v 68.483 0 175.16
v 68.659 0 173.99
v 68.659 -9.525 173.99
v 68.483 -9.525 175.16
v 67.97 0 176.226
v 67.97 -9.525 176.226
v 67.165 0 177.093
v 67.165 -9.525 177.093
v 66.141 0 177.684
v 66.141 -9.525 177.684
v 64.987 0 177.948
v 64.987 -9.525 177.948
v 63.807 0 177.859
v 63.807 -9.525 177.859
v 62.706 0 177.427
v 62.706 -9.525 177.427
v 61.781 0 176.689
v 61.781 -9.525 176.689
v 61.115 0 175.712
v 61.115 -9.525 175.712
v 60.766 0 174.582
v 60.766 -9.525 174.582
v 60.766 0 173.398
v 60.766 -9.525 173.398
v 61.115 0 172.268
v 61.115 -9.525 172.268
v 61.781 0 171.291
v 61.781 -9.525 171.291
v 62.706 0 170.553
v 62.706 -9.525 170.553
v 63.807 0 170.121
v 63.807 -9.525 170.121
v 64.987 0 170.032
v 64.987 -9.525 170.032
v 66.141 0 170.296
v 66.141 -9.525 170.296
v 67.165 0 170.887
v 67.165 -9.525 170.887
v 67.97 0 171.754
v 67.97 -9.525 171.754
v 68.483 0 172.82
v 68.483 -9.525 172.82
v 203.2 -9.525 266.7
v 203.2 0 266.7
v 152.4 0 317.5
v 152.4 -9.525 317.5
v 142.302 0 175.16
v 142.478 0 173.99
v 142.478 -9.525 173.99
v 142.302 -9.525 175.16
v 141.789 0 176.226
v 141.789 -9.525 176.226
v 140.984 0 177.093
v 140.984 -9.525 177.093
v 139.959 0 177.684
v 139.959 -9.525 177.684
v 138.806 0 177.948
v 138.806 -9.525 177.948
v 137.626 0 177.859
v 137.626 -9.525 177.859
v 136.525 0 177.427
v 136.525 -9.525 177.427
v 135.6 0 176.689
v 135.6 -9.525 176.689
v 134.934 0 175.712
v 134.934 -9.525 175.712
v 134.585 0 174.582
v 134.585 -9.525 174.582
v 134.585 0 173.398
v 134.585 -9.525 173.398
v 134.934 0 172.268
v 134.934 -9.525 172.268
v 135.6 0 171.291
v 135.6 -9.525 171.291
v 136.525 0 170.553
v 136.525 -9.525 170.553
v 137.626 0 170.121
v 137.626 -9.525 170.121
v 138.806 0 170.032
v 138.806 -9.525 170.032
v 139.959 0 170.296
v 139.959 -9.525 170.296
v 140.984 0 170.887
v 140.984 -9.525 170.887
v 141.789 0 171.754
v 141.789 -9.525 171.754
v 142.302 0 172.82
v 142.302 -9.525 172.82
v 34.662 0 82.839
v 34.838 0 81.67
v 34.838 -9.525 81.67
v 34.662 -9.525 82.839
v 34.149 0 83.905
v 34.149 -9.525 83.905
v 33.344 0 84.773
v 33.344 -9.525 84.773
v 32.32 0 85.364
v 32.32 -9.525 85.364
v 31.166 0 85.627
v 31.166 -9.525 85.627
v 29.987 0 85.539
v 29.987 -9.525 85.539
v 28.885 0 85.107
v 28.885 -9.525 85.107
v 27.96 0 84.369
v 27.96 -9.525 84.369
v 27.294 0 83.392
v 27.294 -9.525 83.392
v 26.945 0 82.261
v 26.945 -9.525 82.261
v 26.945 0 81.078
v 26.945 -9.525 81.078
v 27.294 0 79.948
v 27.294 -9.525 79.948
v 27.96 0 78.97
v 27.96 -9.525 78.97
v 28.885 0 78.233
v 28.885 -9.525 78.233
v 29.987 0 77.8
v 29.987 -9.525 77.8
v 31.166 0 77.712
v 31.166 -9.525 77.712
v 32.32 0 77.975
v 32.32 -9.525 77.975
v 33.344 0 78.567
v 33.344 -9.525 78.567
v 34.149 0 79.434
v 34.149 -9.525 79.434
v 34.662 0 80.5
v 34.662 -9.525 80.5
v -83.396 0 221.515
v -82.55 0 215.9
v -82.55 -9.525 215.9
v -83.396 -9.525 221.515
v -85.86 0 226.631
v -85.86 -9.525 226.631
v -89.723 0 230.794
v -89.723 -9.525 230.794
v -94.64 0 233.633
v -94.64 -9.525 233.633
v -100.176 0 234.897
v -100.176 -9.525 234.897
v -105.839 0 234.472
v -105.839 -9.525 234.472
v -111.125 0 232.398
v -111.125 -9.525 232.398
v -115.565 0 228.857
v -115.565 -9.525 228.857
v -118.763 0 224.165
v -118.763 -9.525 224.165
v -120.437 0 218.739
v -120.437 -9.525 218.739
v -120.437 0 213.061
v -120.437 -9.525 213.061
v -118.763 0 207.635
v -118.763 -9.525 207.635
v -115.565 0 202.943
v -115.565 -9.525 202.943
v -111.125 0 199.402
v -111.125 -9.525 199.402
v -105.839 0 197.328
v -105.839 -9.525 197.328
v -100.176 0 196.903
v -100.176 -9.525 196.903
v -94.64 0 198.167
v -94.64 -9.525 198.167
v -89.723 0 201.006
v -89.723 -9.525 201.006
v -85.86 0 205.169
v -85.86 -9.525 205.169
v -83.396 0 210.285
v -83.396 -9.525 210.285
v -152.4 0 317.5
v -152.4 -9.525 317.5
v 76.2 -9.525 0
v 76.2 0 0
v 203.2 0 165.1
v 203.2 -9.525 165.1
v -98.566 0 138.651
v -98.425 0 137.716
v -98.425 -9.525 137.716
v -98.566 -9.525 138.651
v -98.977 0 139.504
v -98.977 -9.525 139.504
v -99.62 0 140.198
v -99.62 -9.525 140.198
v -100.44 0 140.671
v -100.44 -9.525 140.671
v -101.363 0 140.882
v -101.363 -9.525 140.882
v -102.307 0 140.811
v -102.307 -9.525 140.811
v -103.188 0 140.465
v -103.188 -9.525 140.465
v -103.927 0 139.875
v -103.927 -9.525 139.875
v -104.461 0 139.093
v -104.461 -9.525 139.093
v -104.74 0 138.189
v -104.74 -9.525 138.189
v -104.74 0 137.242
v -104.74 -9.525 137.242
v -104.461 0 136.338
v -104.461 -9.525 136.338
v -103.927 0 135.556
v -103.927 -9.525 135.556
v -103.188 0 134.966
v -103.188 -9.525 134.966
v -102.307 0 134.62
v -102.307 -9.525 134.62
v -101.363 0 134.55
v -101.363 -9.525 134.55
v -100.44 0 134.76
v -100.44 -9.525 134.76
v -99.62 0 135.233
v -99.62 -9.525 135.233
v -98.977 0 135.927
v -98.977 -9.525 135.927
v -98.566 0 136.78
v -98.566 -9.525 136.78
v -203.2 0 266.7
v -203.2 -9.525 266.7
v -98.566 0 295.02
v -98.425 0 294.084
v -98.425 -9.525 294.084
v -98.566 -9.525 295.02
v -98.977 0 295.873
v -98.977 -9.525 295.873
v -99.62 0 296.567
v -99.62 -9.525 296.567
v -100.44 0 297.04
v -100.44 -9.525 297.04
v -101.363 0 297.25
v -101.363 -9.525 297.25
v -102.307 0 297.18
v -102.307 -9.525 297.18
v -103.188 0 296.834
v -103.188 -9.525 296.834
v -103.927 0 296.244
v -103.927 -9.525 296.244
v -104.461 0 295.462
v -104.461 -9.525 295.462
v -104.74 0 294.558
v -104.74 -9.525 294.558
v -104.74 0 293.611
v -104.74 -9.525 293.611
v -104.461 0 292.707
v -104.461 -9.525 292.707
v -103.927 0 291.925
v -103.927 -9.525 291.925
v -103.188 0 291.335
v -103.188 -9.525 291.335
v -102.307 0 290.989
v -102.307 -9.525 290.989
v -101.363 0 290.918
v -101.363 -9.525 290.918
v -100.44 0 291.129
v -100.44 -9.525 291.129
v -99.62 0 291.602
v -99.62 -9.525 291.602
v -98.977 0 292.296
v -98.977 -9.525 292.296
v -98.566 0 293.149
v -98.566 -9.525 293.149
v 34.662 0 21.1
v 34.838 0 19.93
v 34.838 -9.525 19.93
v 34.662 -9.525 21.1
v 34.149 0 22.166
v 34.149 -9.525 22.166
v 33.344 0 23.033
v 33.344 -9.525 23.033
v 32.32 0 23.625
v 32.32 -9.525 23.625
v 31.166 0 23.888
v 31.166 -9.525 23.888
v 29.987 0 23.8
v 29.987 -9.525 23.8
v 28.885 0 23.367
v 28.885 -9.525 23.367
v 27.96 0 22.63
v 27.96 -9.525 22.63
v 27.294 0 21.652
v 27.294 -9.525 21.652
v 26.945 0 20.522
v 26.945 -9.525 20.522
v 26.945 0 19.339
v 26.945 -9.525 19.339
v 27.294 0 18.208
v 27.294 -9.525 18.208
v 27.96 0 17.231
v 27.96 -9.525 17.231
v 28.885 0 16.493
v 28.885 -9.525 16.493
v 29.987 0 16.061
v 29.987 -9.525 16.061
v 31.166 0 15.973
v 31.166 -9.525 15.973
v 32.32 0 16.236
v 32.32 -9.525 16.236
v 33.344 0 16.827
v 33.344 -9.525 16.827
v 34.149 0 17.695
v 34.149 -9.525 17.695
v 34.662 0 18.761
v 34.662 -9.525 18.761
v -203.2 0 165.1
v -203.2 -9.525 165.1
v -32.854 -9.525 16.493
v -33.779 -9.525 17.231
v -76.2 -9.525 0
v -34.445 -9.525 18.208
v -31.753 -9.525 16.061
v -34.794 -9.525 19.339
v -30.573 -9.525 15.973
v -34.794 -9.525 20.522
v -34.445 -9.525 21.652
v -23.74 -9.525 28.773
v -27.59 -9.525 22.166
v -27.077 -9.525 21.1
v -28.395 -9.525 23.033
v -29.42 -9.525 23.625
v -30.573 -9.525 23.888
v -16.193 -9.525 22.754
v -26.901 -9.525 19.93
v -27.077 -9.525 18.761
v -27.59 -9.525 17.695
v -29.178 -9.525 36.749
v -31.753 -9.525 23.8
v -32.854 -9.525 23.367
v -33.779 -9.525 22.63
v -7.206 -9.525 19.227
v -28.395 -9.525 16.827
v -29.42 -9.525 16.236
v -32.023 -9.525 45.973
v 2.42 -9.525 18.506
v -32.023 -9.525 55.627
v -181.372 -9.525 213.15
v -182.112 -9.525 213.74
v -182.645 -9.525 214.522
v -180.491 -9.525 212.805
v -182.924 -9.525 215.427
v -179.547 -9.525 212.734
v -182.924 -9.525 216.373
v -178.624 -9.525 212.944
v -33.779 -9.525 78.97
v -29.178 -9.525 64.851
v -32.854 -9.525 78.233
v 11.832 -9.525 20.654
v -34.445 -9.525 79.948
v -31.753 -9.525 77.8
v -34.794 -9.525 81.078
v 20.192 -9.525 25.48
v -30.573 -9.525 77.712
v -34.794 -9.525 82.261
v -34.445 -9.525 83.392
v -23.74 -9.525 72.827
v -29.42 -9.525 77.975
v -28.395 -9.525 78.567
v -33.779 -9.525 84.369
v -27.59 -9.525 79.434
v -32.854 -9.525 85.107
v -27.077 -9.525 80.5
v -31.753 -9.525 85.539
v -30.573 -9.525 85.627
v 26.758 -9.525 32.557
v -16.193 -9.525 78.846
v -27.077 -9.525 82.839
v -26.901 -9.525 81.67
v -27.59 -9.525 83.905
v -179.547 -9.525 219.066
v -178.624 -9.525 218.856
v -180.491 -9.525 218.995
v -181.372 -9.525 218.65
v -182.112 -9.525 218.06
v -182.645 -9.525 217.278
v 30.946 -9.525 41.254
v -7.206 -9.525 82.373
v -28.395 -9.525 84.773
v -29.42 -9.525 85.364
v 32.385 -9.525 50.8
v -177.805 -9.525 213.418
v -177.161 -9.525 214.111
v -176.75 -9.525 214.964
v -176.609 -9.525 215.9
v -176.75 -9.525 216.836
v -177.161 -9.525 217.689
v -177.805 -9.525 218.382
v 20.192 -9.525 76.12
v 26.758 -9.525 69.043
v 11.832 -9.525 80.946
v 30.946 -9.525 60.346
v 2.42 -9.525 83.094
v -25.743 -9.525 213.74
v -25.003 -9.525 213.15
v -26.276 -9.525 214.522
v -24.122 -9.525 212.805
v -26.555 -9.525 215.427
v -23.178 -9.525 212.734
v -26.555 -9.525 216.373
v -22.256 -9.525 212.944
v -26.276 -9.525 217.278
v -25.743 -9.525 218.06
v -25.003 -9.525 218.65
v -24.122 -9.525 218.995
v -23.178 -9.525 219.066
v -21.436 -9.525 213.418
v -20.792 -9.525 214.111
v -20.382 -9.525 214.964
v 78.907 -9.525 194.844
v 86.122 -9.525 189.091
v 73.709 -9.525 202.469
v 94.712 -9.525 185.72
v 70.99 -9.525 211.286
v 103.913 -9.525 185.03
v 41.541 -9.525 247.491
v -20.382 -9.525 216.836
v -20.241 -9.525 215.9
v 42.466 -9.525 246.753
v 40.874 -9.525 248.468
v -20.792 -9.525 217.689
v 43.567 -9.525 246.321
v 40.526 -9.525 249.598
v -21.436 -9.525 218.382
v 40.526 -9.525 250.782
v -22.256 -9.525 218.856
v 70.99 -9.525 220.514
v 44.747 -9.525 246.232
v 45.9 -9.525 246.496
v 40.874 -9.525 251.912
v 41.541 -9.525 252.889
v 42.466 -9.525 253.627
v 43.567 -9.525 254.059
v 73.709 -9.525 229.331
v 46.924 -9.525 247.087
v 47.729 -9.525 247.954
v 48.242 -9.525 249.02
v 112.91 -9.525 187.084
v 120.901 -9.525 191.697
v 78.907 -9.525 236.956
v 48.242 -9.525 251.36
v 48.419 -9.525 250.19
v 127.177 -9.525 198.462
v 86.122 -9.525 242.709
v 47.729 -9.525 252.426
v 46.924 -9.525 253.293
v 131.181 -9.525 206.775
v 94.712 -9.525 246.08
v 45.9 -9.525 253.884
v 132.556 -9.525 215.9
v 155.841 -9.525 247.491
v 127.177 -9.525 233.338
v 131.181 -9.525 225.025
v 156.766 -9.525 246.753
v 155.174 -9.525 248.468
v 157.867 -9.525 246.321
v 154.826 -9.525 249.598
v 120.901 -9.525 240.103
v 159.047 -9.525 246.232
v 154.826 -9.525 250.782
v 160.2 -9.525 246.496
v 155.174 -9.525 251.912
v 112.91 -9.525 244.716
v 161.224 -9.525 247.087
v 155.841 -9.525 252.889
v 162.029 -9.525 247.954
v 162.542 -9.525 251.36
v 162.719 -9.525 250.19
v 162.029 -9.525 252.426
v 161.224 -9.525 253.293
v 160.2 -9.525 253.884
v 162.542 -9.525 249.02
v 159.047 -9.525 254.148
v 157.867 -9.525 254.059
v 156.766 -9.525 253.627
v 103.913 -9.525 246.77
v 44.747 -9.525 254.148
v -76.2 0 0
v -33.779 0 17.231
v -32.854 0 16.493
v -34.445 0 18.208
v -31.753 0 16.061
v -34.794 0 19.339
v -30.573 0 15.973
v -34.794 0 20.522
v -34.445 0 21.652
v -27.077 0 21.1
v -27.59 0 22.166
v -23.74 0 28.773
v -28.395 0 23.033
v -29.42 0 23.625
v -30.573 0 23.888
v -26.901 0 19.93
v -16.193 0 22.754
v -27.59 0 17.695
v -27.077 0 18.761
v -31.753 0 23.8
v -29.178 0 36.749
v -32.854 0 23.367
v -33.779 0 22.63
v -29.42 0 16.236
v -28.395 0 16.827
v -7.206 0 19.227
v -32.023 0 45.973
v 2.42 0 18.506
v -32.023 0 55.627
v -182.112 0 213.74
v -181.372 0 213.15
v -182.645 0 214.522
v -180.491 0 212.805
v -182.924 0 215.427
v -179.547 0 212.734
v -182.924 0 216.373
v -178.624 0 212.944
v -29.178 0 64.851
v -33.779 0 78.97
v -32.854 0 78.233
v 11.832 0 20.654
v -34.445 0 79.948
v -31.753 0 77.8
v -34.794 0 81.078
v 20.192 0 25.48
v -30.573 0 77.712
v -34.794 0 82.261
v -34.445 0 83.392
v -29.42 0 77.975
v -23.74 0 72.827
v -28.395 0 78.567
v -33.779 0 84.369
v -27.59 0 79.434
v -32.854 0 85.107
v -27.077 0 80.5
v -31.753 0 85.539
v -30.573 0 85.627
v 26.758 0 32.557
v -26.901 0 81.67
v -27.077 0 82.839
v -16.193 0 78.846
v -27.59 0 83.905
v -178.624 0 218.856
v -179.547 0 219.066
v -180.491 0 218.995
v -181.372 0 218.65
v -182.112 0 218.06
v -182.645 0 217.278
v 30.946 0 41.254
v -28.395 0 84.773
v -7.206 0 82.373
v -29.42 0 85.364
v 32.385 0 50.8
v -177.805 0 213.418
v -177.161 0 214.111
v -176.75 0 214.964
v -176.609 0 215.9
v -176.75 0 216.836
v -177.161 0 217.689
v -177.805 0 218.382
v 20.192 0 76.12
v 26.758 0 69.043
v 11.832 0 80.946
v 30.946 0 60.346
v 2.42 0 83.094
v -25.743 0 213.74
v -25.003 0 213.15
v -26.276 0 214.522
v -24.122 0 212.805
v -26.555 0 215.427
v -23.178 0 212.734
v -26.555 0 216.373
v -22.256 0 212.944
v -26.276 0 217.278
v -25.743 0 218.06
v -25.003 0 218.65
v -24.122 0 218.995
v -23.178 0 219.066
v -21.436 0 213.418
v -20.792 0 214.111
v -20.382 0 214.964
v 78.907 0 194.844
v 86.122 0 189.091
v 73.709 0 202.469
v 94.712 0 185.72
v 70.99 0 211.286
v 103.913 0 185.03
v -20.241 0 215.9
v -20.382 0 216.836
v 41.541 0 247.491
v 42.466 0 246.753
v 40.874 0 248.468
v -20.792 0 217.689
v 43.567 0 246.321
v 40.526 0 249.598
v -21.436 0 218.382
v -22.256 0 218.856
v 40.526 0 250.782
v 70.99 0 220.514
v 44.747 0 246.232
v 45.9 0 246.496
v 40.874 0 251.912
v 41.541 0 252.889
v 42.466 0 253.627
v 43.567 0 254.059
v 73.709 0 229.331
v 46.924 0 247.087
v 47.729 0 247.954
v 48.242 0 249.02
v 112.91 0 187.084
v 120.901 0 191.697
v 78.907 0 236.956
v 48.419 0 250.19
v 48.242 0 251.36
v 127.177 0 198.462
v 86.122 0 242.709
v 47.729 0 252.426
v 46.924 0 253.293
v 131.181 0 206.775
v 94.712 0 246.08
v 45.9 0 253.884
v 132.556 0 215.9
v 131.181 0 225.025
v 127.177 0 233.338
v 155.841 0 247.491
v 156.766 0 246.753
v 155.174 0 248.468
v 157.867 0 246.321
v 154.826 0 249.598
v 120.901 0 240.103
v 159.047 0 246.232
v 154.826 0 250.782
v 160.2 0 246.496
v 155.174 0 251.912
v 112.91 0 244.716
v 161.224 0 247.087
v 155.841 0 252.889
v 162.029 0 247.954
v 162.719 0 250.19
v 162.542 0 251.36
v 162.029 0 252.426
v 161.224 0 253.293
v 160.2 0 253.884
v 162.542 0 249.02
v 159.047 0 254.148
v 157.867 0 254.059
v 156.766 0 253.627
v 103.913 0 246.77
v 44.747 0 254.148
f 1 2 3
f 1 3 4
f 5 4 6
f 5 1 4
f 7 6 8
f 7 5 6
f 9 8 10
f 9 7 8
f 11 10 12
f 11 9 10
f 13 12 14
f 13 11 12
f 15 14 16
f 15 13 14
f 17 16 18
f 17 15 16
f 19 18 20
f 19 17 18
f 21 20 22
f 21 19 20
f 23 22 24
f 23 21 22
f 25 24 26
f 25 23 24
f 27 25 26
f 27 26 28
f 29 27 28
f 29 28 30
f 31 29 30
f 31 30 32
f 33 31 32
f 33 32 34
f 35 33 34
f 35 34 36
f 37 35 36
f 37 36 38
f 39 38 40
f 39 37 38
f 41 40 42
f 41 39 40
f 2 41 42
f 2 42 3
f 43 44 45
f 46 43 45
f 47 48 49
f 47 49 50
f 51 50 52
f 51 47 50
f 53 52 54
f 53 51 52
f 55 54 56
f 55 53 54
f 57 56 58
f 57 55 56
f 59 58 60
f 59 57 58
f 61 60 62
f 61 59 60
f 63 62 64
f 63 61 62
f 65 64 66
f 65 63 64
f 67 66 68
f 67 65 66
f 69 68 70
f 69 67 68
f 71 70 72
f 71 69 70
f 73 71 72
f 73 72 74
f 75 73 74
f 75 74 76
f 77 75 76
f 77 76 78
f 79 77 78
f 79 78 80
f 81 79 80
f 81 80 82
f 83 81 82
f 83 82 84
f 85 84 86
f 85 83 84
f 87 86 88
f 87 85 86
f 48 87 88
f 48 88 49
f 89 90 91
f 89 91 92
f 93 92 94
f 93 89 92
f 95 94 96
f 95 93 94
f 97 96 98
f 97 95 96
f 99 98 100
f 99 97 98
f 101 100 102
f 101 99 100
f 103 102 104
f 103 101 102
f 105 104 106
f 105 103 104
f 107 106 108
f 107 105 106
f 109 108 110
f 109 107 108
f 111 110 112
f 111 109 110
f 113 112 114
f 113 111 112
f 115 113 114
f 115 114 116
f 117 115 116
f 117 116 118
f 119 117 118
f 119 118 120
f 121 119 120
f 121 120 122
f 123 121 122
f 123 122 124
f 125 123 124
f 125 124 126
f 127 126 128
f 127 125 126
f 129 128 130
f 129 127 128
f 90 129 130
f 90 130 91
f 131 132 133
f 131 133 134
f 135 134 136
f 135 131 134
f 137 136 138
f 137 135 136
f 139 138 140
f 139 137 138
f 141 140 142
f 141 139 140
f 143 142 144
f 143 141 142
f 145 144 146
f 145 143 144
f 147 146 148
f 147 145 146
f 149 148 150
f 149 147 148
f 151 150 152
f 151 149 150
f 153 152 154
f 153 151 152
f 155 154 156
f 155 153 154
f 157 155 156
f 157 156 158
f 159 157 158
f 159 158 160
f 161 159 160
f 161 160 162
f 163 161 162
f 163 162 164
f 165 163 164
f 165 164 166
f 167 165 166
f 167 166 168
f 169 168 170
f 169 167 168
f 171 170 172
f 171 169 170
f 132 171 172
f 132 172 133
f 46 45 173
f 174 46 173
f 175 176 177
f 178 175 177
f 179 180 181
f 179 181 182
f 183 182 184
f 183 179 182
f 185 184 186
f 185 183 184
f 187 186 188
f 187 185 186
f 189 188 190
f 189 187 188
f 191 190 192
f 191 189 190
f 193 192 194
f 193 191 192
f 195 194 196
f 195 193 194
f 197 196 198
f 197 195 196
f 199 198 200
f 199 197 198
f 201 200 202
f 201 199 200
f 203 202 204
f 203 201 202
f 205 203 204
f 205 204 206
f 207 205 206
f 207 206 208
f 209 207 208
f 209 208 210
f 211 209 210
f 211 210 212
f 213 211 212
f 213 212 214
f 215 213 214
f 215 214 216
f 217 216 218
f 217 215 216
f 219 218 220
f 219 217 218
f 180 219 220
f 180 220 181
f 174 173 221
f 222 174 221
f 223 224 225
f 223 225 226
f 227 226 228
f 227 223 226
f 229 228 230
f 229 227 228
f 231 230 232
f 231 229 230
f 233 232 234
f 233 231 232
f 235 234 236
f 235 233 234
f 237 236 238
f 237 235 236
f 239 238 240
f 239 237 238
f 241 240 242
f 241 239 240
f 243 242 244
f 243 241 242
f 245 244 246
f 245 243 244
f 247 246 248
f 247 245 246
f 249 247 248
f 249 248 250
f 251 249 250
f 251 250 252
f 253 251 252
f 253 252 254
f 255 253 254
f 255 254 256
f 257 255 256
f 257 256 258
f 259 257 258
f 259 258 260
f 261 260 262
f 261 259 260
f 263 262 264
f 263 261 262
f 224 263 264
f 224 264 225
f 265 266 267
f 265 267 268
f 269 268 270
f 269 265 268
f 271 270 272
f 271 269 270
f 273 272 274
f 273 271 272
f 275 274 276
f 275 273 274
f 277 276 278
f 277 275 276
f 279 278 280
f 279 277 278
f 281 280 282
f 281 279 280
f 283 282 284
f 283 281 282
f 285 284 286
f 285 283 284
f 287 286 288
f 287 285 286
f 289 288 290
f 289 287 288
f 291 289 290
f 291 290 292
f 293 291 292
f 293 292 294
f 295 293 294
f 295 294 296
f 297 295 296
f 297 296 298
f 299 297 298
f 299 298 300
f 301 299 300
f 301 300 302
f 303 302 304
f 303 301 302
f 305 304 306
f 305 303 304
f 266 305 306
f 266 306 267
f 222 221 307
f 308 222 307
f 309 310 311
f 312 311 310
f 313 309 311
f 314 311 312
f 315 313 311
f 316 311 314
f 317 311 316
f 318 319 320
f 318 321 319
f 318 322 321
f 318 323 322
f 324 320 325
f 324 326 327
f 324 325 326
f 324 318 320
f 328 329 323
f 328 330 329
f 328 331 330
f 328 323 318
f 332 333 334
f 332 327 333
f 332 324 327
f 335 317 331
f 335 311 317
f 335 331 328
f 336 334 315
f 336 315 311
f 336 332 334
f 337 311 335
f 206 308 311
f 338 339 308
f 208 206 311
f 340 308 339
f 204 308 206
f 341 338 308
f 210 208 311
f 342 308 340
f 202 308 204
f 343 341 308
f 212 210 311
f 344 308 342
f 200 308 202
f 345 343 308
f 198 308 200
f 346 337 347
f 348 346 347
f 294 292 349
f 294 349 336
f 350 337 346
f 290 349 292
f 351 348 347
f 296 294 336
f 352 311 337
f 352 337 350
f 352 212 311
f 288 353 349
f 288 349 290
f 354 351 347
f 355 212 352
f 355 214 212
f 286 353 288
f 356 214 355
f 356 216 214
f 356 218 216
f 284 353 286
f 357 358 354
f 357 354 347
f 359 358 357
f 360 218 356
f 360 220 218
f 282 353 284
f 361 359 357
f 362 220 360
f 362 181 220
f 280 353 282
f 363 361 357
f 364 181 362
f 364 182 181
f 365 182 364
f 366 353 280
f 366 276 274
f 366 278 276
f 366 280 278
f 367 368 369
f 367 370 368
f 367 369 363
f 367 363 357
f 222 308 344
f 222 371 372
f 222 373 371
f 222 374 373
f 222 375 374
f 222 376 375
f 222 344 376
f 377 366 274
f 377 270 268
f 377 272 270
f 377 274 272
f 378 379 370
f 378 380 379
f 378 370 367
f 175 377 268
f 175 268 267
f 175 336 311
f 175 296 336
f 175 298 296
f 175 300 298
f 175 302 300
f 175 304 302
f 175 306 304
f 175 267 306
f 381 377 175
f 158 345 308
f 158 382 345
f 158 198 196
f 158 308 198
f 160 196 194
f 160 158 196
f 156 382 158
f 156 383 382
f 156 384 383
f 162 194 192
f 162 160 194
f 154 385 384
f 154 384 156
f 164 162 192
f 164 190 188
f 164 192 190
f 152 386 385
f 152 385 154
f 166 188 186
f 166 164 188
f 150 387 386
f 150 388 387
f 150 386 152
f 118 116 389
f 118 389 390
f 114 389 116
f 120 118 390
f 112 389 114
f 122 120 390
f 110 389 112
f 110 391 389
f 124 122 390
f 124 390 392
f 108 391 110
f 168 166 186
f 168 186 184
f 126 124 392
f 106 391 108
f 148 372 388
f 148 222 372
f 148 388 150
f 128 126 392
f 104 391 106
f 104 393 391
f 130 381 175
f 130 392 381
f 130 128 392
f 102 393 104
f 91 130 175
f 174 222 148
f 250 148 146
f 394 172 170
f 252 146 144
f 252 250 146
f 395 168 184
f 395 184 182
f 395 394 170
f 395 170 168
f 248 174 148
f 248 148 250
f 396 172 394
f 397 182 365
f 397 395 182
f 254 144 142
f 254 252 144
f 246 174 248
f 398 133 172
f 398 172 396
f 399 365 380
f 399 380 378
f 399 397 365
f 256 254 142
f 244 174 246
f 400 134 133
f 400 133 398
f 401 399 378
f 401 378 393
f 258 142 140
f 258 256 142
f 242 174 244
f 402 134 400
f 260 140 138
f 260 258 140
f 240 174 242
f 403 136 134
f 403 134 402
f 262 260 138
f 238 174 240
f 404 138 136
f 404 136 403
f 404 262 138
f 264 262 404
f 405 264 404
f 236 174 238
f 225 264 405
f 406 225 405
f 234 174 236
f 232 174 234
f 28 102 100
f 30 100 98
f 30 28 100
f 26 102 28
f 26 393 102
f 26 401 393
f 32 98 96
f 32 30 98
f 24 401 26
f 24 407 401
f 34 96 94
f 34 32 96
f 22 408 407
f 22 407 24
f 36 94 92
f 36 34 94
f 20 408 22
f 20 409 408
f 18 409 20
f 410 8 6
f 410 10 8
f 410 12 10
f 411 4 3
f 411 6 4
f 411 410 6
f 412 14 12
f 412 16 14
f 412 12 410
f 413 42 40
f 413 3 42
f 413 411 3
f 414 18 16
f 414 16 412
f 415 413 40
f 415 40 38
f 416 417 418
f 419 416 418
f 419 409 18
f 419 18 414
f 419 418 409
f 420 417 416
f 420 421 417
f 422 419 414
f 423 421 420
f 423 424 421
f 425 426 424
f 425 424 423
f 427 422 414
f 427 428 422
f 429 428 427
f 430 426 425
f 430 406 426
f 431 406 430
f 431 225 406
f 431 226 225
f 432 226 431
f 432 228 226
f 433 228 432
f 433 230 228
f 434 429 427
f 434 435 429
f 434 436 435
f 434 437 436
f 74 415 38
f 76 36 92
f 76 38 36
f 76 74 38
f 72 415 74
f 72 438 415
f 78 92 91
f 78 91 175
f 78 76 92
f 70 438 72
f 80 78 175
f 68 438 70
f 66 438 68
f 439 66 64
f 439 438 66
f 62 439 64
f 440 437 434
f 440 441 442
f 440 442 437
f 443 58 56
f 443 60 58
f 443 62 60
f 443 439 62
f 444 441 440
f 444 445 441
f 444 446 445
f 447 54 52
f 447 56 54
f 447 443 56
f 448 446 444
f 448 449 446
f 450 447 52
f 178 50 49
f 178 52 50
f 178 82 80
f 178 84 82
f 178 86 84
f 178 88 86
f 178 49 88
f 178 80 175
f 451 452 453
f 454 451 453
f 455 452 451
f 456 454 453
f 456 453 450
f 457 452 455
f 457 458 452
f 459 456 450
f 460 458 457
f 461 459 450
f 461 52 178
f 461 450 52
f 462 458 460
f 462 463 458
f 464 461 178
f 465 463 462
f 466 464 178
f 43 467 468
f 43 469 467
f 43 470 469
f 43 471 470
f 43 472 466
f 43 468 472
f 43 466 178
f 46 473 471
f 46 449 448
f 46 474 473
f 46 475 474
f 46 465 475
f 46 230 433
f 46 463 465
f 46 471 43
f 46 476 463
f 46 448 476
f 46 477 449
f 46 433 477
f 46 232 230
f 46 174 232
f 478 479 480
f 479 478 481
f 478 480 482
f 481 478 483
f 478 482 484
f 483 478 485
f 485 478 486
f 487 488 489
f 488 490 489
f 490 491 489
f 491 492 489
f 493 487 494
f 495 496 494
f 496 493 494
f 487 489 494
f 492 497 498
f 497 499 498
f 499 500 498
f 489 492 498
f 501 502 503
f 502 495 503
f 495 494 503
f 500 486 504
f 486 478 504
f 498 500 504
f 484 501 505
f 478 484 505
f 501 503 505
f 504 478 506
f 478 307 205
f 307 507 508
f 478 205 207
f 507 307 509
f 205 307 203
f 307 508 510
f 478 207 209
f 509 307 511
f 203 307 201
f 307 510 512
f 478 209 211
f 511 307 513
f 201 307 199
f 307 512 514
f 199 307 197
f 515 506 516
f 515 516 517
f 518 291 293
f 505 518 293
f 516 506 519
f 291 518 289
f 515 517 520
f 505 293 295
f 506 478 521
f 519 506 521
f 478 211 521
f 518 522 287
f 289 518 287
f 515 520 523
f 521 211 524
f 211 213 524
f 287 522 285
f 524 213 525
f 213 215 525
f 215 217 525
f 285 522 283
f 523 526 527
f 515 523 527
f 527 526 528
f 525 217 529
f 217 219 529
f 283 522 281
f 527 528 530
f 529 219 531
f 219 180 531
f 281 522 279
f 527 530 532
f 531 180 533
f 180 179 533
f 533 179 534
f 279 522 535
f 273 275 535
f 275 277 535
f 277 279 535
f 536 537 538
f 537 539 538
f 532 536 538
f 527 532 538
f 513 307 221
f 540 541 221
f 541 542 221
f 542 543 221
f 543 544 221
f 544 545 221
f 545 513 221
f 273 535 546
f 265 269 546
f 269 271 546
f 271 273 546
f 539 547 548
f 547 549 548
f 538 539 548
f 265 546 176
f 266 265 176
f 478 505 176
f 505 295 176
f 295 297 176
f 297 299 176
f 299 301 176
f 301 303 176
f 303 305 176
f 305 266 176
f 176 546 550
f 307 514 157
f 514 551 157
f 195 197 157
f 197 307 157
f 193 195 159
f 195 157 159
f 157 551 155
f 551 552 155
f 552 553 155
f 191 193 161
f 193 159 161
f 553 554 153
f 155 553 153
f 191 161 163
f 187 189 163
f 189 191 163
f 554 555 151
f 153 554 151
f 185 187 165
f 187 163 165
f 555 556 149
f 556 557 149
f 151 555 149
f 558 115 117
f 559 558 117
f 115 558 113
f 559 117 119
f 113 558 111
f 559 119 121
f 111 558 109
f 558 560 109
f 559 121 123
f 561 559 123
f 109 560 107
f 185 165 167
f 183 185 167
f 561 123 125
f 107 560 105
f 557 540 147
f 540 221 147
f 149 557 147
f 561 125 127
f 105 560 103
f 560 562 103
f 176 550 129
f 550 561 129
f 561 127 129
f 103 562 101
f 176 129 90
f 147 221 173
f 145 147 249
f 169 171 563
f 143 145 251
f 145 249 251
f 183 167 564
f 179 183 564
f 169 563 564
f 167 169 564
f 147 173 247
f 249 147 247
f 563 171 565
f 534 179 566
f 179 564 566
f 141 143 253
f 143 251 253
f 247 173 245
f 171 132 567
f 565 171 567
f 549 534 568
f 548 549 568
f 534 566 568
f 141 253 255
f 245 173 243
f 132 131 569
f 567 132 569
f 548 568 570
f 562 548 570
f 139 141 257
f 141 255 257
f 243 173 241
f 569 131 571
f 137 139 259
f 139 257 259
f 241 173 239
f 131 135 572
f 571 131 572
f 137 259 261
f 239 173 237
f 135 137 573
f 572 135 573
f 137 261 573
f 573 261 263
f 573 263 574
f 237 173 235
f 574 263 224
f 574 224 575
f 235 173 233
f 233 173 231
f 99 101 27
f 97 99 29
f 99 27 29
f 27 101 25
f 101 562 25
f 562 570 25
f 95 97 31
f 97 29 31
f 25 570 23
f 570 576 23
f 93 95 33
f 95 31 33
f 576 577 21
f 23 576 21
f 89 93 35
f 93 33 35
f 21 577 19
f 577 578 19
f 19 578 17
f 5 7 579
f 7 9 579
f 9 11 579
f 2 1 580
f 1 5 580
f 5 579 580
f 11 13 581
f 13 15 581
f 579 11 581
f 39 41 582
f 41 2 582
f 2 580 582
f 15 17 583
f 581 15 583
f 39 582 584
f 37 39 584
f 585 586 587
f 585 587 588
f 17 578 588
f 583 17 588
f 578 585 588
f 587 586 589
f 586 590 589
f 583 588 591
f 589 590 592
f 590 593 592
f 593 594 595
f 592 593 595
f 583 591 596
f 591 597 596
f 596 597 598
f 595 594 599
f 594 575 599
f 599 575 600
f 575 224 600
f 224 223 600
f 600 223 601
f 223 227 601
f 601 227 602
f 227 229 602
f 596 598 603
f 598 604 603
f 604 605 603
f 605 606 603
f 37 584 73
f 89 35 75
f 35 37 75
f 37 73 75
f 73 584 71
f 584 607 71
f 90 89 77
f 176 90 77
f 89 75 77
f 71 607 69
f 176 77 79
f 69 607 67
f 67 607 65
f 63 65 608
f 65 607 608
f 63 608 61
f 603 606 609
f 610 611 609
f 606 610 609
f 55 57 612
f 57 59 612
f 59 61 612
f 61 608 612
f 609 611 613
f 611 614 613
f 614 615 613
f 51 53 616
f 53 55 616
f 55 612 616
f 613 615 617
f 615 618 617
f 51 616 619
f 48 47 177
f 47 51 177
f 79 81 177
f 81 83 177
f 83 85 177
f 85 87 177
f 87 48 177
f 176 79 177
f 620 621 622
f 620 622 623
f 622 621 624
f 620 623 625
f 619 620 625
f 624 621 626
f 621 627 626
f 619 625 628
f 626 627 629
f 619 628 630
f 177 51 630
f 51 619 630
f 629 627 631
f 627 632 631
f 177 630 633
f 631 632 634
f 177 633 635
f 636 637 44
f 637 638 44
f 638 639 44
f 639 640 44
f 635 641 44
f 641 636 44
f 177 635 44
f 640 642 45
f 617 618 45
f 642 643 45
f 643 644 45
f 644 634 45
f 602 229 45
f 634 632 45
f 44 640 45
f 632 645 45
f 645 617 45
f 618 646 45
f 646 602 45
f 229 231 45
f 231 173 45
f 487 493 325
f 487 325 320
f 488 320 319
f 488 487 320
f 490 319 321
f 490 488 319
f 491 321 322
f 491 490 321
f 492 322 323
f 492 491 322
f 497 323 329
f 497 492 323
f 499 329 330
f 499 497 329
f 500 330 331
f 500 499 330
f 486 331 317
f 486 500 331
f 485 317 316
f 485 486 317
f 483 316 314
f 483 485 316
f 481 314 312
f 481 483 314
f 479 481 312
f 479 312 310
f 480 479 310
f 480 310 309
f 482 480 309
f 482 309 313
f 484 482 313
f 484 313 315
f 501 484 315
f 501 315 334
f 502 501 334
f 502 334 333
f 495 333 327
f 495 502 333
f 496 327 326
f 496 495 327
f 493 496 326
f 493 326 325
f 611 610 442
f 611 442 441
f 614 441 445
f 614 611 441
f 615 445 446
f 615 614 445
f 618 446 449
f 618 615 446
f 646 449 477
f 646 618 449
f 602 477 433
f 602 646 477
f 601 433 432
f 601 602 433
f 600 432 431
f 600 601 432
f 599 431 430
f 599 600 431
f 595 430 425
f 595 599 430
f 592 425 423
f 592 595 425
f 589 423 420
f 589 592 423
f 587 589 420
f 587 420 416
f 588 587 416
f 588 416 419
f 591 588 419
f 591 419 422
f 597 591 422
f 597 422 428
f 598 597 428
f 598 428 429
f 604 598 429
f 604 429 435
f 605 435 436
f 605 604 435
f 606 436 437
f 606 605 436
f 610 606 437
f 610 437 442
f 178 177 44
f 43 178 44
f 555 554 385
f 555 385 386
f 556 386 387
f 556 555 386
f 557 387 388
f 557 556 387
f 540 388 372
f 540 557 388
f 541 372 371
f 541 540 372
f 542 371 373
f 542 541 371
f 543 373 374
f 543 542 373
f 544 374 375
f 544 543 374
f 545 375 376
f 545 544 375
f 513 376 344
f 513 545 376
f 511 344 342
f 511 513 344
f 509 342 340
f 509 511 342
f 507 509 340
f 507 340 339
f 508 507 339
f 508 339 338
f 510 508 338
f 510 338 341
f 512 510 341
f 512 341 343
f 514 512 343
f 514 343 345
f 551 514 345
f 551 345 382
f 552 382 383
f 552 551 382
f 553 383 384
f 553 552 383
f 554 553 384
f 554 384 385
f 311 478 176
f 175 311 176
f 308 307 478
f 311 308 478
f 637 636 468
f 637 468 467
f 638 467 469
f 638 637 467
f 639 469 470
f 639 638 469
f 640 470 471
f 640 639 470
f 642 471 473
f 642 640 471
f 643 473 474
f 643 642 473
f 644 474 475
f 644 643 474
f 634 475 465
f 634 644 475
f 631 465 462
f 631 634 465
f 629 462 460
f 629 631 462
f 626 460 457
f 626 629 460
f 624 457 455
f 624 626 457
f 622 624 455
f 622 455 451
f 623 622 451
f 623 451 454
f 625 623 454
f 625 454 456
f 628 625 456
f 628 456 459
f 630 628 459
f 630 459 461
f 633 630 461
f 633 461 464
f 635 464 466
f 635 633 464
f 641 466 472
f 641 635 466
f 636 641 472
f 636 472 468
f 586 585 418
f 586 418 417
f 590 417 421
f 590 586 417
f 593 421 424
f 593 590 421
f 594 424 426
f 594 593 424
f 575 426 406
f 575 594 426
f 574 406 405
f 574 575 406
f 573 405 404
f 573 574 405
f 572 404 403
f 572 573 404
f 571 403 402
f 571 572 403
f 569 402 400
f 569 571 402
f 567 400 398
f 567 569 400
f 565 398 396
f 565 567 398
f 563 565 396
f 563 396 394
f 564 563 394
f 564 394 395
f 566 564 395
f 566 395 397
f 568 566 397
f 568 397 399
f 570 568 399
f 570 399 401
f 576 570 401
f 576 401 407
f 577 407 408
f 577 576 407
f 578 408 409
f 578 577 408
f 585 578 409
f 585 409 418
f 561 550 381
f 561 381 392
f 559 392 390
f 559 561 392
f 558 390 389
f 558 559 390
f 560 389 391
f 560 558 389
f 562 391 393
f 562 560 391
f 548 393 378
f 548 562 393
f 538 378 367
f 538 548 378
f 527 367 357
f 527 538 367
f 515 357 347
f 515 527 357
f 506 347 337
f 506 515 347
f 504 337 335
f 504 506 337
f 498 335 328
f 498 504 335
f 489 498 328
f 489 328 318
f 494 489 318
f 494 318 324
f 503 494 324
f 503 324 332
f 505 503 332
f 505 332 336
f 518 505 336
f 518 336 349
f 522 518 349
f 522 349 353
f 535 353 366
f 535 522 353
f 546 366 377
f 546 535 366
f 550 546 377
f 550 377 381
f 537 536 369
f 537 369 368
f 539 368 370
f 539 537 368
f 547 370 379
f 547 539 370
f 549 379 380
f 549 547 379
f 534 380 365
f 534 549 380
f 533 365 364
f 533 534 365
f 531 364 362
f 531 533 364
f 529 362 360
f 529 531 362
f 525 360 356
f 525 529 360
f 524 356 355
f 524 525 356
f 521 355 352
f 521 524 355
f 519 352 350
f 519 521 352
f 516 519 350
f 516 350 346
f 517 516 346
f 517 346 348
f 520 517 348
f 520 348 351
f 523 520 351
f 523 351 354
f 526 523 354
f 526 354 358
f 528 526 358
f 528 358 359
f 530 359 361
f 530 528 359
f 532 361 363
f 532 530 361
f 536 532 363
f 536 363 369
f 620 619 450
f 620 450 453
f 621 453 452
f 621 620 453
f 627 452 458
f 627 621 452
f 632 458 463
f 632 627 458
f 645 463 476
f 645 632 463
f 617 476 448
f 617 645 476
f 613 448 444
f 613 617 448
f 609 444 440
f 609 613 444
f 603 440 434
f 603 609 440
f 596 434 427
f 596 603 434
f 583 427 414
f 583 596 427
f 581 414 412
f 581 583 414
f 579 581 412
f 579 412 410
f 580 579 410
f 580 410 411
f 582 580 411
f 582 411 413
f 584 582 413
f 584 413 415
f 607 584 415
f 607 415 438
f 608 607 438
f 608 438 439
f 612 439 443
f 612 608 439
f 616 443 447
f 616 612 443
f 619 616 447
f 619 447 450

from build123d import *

# Parameters (mm, degrees)
F0_R     = 3.96875
F0_R_2   = 3.175
F0_R_3   = 32.385
F0_R_4   = 19.05
F0_R_5   = 30.95625
F1_DEPTH = 9.525


with BuildPart() as f1:
    # F0 (on Front) → F1 (new body)
    with BuildSketch(Plane.XZ):
        Polygon((-76.2, 0), (0, 0), (76.2, 0), (203.2, 165.1), (203.2, 266.7), (152.4, 317.5), (0, 317.5), (-152.4, 317.5), (-203.2, 266.7), (-203.2, 165.1), align=None)
        with Locations((-30.86963, 19.93037)):
            Circle(F0_R, mode=Mode.SUBTRACT)
        with Locations((-30.86963, 81.66963)):
            Circle(F0_R, mode=Mode.SUBTRACT)
        with Locations((-101.6, 137.715625)):
            Circle(F0_R_2, mode=Mode.SUBTRACT)
        with Locations((30.86963, 19.93037)):
            Circle(F0_R, mode=Mode.SUBTRACT)
        with Locations((0, 50.8)):
            Circle(F0_R_3, mode=Mode.SUBTRACT)
        with Locations((30.86963, 81.66963)):
            Circle(F0_R, mode=Mode.SUBTRACT)
        with Locations((-179.784375, 215.9)):
            Circle(F0_R_2, mode=Mode.SUBTRACT)
        with Locations((-101.6, 215.9)):
            Circle(F0_R_4, mode=Mode.SUBTRACT)
        with Locations((-23.415625, 215.9)):
            Circle(F0_R_2, mode=Mode.SUBTRACT)
        with Locations((-101.6, 294.084375)):
            Circle(F0_R_2, mode=Mode.SUBTRACT)
        with Locations((64.690625, 173.99)):
            Circle(F0_R, mode=Mode.SUBTRACT)
        with Locations((138.509375, 173.99)):
            Circle(F0_R, mode=Mode.SUBTRACT)
        with Locations((101.6, 215.9)):
            Circle(F0_R_5, mode=Mode.SUBTRACT)
        with Locations((44.45, 250.19)):
            Circle(F0_R, mode=Mode.SUBTRACT)
        with Locations((158.75, 250.19)):
            Circle(F0_R, mode=Mode.SUBTRACT)
    extrude(amount=F1_DEPTH)


solid = f1.part
